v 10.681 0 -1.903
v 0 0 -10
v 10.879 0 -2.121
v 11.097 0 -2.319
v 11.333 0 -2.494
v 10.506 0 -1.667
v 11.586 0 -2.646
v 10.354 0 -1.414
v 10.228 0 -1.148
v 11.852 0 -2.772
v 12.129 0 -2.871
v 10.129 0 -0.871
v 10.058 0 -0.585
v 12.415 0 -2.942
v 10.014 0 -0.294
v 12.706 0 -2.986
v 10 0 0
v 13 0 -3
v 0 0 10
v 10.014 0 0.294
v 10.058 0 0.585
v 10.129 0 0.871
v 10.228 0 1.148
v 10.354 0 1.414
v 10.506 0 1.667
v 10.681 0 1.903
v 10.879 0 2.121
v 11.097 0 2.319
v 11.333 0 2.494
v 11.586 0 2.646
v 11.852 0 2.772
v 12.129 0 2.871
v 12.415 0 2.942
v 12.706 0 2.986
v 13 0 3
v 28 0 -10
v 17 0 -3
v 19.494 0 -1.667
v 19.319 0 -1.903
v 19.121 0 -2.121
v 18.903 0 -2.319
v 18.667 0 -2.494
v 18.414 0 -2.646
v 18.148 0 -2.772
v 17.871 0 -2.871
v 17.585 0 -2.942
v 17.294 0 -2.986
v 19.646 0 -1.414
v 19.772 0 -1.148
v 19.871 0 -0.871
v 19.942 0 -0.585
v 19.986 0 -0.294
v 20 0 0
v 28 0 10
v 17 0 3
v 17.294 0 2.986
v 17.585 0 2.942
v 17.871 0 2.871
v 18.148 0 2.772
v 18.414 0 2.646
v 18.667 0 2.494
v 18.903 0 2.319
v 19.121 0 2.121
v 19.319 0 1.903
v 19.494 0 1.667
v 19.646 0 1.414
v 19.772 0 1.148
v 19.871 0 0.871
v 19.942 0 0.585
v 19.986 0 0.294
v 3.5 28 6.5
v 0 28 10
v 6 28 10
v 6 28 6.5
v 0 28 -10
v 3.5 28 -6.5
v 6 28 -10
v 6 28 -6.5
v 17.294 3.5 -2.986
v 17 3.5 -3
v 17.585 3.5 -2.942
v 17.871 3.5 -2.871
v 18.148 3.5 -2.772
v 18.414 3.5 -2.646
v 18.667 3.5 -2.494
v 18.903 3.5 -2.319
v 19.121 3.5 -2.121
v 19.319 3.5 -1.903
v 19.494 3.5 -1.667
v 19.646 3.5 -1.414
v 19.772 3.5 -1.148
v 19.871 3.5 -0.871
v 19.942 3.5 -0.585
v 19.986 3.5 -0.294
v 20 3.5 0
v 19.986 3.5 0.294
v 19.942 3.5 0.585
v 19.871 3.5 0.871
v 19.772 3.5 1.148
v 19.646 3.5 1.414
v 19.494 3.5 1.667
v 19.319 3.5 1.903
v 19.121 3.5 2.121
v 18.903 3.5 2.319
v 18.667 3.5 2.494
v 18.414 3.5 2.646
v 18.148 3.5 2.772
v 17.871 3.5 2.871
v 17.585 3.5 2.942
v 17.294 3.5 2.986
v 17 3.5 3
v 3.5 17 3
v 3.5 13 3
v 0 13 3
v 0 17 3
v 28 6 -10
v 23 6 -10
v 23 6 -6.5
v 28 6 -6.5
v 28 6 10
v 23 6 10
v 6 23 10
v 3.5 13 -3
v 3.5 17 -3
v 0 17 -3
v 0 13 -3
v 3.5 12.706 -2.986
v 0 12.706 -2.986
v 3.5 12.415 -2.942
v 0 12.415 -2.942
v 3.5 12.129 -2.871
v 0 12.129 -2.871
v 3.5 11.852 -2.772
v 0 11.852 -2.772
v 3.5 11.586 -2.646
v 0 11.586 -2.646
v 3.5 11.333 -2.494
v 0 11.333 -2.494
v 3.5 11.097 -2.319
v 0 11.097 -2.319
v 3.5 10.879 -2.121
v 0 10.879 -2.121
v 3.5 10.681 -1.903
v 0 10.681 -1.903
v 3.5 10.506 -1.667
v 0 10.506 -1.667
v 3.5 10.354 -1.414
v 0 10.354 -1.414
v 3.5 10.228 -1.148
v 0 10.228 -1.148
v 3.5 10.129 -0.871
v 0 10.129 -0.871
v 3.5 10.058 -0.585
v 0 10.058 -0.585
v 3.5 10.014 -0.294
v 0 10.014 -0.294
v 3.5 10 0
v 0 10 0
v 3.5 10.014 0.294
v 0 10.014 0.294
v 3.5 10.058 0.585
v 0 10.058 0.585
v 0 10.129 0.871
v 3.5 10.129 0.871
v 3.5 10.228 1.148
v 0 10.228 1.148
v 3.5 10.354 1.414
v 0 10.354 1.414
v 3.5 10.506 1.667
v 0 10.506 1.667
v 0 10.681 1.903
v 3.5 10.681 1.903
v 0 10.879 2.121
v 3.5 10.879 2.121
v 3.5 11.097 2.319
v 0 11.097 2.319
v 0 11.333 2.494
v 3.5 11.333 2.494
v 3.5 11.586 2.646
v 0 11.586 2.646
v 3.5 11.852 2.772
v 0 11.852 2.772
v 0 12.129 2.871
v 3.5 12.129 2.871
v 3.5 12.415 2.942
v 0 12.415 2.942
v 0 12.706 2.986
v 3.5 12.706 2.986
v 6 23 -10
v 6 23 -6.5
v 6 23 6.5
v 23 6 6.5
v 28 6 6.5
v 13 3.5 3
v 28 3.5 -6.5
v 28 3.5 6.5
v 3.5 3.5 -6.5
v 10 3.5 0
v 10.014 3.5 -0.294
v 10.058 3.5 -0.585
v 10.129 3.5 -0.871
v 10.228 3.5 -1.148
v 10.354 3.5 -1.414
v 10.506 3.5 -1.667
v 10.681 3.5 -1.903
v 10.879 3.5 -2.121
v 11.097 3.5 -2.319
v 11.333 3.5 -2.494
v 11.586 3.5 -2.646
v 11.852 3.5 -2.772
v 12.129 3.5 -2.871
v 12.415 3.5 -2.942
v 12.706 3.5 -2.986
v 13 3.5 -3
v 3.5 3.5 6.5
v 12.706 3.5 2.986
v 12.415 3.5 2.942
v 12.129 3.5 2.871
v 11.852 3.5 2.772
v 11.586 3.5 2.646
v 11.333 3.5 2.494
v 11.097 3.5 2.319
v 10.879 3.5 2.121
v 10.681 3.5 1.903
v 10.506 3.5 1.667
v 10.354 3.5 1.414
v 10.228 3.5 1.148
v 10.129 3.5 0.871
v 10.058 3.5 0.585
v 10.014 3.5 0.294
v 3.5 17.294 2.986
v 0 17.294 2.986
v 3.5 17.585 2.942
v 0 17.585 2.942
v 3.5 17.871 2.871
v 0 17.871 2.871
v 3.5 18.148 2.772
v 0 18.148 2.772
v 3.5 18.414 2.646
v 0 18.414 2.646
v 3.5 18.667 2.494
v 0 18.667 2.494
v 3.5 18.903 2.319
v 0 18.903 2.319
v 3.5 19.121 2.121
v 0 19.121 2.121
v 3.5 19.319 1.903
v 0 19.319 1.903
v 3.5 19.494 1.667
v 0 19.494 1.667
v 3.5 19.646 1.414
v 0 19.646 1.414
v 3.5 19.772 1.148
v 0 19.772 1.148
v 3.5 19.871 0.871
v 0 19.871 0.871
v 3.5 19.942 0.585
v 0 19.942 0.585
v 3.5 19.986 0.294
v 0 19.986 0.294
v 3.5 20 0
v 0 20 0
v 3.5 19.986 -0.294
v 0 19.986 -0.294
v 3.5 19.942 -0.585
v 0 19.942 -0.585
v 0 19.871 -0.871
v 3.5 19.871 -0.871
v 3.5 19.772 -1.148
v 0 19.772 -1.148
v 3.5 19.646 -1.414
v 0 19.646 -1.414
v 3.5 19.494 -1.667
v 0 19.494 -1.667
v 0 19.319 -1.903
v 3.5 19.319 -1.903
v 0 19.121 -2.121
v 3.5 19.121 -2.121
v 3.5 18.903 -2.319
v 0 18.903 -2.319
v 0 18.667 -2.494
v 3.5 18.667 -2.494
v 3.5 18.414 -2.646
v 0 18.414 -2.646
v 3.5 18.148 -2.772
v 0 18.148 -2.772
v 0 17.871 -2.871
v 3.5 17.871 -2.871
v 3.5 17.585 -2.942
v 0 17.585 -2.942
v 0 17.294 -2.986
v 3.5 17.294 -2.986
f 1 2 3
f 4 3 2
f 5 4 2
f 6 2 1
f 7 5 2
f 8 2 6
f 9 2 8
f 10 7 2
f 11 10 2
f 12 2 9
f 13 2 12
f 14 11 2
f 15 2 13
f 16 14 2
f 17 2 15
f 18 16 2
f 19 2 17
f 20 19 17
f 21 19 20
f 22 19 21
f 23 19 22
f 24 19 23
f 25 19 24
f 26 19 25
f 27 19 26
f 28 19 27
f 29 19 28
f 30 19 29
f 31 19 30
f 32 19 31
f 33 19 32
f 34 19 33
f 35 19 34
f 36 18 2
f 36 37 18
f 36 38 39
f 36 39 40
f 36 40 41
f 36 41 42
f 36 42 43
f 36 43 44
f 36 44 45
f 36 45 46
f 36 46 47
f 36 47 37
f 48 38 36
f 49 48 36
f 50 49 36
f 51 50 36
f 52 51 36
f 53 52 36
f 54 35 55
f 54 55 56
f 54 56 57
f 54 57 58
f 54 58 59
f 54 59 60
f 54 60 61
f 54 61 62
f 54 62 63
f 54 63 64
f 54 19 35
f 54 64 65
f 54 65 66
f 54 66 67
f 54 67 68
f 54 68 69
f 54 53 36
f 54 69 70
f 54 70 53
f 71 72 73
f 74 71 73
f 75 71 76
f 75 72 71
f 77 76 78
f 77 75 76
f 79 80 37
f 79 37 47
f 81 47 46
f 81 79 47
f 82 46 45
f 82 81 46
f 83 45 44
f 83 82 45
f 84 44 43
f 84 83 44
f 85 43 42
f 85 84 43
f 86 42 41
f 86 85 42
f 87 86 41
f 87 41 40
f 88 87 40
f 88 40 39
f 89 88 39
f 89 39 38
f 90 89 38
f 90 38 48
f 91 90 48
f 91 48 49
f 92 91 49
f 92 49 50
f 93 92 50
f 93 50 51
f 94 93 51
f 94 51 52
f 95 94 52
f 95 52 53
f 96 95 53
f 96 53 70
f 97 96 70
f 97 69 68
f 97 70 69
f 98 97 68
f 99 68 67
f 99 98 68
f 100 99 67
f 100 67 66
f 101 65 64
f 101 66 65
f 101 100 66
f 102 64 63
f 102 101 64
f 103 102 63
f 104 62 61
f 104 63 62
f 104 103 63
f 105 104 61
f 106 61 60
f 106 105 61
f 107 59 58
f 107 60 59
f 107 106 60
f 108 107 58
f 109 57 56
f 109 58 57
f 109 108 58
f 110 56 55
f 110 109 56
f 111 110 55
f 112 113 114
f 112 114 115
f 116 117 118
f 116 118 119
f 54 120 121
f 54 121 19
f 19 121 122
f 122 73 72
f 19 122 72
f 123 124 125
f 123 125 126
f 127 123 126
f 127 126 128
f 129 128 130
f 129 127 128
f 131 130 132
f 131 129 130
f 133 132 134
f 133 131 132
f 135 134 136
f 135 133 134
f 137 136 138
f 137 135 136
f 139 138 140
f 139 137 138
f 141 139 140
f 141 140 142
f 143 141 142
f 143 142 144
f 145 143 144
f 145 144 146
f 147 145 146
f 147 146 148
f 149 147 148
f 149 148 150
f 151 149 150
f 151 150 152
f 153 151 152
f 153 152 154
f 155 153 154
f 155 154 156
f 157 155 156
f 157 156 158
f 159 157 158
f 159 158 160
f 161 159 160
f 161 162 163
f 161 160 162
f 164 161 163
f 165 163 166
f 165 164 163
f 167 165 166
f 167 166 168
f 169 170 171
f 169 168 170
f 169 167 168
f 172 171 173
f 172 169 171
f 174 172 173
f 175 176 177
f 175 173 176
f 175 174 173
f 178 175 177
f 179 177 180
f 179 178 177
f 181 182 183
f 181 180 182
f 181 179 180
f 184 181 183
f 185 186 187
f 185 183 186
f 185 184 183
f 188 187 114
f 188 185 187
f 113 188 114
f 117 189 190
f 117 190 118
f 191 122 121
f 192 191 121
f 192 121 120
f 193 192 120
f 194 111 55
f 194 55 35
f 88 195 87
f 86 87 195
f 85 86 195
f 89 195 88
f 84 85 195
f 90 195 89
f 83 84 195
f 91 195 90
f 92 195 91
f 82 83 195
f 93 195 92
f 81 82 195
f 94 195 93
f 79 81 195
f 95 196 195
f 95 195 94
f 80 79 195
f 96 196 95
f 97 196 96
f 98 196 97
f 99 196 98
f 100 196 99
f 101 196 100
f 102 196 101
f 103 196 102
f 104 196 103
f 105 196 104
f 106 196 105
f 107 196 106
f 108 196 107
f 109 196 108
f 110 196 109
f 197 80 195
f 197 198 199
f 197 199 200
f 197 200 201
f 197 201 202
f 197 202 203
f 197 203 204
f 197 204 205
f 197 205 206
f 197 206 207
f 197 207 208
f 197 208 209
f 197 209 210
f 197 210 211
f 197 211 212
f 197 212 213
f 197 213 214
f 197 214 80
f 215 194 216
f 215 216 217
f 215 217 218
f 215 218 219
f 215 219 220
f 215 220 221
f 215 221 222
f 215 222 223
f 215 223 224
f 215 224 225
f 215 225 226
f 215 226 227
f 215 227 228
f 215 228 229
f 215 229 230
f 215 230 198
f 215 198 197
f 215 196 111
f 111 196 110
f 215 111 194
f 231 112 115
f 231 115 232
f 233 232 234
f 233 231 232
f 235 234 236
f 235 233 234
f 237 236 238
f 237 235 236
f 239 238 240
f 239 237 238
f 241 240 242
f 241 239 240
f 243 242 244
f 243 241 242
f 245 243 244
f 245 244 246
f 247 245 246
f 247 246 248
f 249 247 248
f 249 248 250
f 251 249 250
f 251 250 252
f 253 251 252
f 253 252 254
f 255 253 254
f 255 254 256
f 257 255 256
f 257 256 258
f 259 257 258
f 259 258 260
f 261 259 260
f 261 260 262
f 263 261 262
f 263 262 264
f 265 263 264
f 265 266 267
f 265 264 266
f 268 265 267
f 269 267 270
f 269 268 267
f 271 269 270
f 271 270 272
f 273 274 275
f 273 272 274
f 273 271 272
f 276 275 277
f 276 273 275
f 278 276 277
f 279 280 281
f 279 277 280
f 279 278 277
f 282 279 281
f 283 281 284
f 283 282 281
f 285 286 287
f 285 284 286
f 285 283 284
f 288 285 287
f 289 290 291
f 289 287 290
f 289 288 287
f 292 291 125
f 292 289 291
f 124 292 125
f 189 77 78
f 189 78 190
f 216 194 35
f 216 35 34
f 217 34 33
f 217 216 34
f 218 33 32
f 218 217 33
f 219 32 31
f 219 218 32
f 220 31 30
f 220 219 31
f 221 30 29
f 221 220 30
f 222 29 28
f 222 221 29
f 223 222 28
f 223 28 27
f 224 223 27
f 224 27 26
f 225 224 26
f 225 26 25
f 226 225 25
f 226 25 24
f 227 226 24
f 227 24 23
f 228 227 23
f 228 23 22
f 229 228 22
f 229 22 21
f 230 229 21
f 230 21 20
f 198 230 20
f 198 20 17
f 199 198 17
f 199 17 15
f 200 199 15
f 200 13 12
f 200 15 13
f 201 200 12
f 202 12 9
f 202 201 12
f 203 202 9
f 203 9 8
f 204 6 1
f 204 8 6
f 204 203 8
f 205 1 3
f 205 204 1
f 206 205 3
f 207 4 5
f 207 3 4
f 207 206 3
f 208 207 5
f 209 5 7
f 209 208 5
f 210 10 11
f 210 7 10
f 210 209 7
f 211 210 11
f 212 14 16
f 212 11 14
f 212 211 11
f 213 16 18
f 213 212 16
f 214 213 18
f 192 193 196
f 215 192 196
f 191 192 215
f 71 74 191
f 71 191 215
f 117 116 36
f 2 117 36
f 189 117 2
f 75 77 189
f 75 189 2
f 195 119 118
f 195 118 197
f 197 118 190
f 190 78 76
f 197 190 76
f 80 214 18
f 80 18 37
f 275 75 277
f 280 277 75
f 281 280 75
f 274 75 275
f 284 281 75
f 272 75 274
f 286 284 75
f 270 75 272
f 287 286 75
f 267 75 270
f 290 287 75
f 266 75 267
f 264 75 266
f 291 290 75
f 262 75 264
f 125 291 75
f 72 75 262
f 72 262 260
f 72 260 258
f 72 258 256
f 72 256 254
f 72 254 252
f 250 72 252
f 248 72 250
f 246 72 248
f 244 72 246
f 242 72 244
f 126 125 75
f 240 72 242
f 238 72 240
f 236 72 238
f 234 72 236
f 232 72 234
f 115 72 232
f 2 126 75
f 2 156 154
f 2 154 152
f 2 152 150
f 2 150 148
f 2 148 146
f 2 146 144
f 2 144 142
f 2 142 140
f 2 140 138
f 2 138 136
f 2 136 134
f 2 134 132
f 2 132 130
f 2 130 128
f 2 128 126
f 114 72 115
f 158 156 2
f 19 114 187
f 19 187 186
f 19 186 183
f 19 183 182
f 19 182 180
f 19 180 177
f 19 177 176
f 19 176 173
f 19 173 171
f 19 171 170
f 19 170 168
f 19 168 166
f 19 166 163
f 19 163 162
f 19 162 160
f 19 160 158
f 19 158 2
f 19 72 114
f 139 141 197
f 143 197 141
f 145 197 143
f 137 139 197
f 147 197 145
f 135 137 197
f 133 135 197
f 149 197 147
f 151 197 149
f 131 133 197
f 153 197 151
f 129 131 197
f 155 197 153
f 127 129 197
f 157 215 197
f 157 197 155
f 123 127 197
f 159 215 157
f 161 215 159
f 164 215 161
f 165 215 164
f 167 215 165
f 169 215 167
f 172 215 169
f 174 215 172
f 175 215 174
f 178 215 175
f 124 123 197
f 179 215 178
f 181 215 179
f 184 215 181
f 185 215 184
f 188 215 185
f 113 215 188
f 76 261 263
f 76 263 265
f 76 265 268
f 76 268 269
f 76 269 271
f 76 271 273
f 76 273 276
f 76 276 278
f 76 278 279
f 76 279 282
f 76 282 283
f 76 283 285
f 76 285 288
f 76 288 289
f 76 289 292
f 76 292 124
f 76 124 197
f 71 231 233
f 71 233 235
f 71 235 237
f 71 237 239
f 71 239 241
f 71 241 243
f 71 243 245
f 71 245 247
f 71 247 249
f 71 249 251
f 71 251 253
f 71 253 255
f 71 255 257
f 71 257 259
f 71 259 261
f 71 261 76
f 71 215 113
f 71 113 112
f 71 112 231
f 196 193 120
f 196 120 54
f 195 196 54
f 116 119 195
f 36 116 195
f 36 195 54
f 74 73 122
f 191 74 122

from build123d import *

# Parameters (mm, degrees)
BOSS_EXTRUDE1_DEPTH = 10
BOSS_EXTRUDE2_DEPTH = 3.5
CUT_EXTRUDE1_REACH  = 40.526
CUT_EXTRUDE2_REACH  = 40.526


with BuildPart() as part:
    # Sketch1 → Boss-Extrude1 (new, symmetric)
    with BuildSketch(Plane.XY):
        Polygon((0, 28), (0, 0), (28, 0), (28, 3.5), (3.5, 3.5), (3.5, 28), align=None)
    extrude(amount=BOSS_EXTRUDE1_DEPTH, both=True)

    # Sketch2 → Boss-Extrude2 (add)
    with BuildSketch(Plane.XY.offset(10)):
        Polygon((3.5, 28), (6, 28), (6, 23), (23, 6), (28, 6), (28, 3.5), (3.5, 3.5), align=None)
    boss_extrude2 = extrude(amount=-BOSS_EXTRUDE2_DEPTH)

    # Mirror1: Boss-Extrude2 across plane
    add(boss_extrude2.mirror(Plane.XY))

    # Sketch3 → Cut-Extrude1 (cut, up to next)
    with BuildSketch(Plane(origin=(0, 3.5, 0), x_dir=(1, 0, 0), z_dir=(0, 1, 0)), mode=Mode.PRIVATE) as cut_extrude1_sk1:
        with BuildLine():
            Line((13, 3), (17, 3))
            ThreePointArc((17, 3), (20, 0), (17, -3))
            Line((17, -3), (13, -3))
            ThreePointArc((13, -3), (10, 0), (13, 3))
        make_face()
    cut_extrude1_tool1 = extrude(cut_extrude1_sk1.sketch, amount=-CUT_EXTRUDE1_REACH, mode=Mode.PRIVATE) & part.part
    add(cut_extrude1_tool1.solids().sort_by_distance((15, 3.5, 0))[0], mode=Mode.SUBTRACT)

    # Sketch4 → Cut-Extrude2 (cut, up to next)
    with BuildSketch(Plane(origin=(3.5, 0, 0), x_dir=(0, 0, -1), z_dir=(1, 0, 0)), mode=Mode.PRIVATE) as cut_extrude2_sk1:
        with BuildLine():
            Line((-3, 13), (-3, 17))
            ThreePointArc((-3, 17), (0, 20), (3, 17))
            Line((3, 17), (3, 13))
            ThreePointArc((3, 13), (0, 10), (-3, 13))
        make_face()
    cut_extrude2_tool1 = extrude(cut_extrude2_sk1.sketch, amount=-CUT_EXTRUDE2_REACH, mode=Mode.PRIVATE) & part.part
    add(cut_extrude2_tool1.solids().sort_by_distance((3.5, 15, 0))[0], mode=Mode.SUBTRACT)


solid = part.part
